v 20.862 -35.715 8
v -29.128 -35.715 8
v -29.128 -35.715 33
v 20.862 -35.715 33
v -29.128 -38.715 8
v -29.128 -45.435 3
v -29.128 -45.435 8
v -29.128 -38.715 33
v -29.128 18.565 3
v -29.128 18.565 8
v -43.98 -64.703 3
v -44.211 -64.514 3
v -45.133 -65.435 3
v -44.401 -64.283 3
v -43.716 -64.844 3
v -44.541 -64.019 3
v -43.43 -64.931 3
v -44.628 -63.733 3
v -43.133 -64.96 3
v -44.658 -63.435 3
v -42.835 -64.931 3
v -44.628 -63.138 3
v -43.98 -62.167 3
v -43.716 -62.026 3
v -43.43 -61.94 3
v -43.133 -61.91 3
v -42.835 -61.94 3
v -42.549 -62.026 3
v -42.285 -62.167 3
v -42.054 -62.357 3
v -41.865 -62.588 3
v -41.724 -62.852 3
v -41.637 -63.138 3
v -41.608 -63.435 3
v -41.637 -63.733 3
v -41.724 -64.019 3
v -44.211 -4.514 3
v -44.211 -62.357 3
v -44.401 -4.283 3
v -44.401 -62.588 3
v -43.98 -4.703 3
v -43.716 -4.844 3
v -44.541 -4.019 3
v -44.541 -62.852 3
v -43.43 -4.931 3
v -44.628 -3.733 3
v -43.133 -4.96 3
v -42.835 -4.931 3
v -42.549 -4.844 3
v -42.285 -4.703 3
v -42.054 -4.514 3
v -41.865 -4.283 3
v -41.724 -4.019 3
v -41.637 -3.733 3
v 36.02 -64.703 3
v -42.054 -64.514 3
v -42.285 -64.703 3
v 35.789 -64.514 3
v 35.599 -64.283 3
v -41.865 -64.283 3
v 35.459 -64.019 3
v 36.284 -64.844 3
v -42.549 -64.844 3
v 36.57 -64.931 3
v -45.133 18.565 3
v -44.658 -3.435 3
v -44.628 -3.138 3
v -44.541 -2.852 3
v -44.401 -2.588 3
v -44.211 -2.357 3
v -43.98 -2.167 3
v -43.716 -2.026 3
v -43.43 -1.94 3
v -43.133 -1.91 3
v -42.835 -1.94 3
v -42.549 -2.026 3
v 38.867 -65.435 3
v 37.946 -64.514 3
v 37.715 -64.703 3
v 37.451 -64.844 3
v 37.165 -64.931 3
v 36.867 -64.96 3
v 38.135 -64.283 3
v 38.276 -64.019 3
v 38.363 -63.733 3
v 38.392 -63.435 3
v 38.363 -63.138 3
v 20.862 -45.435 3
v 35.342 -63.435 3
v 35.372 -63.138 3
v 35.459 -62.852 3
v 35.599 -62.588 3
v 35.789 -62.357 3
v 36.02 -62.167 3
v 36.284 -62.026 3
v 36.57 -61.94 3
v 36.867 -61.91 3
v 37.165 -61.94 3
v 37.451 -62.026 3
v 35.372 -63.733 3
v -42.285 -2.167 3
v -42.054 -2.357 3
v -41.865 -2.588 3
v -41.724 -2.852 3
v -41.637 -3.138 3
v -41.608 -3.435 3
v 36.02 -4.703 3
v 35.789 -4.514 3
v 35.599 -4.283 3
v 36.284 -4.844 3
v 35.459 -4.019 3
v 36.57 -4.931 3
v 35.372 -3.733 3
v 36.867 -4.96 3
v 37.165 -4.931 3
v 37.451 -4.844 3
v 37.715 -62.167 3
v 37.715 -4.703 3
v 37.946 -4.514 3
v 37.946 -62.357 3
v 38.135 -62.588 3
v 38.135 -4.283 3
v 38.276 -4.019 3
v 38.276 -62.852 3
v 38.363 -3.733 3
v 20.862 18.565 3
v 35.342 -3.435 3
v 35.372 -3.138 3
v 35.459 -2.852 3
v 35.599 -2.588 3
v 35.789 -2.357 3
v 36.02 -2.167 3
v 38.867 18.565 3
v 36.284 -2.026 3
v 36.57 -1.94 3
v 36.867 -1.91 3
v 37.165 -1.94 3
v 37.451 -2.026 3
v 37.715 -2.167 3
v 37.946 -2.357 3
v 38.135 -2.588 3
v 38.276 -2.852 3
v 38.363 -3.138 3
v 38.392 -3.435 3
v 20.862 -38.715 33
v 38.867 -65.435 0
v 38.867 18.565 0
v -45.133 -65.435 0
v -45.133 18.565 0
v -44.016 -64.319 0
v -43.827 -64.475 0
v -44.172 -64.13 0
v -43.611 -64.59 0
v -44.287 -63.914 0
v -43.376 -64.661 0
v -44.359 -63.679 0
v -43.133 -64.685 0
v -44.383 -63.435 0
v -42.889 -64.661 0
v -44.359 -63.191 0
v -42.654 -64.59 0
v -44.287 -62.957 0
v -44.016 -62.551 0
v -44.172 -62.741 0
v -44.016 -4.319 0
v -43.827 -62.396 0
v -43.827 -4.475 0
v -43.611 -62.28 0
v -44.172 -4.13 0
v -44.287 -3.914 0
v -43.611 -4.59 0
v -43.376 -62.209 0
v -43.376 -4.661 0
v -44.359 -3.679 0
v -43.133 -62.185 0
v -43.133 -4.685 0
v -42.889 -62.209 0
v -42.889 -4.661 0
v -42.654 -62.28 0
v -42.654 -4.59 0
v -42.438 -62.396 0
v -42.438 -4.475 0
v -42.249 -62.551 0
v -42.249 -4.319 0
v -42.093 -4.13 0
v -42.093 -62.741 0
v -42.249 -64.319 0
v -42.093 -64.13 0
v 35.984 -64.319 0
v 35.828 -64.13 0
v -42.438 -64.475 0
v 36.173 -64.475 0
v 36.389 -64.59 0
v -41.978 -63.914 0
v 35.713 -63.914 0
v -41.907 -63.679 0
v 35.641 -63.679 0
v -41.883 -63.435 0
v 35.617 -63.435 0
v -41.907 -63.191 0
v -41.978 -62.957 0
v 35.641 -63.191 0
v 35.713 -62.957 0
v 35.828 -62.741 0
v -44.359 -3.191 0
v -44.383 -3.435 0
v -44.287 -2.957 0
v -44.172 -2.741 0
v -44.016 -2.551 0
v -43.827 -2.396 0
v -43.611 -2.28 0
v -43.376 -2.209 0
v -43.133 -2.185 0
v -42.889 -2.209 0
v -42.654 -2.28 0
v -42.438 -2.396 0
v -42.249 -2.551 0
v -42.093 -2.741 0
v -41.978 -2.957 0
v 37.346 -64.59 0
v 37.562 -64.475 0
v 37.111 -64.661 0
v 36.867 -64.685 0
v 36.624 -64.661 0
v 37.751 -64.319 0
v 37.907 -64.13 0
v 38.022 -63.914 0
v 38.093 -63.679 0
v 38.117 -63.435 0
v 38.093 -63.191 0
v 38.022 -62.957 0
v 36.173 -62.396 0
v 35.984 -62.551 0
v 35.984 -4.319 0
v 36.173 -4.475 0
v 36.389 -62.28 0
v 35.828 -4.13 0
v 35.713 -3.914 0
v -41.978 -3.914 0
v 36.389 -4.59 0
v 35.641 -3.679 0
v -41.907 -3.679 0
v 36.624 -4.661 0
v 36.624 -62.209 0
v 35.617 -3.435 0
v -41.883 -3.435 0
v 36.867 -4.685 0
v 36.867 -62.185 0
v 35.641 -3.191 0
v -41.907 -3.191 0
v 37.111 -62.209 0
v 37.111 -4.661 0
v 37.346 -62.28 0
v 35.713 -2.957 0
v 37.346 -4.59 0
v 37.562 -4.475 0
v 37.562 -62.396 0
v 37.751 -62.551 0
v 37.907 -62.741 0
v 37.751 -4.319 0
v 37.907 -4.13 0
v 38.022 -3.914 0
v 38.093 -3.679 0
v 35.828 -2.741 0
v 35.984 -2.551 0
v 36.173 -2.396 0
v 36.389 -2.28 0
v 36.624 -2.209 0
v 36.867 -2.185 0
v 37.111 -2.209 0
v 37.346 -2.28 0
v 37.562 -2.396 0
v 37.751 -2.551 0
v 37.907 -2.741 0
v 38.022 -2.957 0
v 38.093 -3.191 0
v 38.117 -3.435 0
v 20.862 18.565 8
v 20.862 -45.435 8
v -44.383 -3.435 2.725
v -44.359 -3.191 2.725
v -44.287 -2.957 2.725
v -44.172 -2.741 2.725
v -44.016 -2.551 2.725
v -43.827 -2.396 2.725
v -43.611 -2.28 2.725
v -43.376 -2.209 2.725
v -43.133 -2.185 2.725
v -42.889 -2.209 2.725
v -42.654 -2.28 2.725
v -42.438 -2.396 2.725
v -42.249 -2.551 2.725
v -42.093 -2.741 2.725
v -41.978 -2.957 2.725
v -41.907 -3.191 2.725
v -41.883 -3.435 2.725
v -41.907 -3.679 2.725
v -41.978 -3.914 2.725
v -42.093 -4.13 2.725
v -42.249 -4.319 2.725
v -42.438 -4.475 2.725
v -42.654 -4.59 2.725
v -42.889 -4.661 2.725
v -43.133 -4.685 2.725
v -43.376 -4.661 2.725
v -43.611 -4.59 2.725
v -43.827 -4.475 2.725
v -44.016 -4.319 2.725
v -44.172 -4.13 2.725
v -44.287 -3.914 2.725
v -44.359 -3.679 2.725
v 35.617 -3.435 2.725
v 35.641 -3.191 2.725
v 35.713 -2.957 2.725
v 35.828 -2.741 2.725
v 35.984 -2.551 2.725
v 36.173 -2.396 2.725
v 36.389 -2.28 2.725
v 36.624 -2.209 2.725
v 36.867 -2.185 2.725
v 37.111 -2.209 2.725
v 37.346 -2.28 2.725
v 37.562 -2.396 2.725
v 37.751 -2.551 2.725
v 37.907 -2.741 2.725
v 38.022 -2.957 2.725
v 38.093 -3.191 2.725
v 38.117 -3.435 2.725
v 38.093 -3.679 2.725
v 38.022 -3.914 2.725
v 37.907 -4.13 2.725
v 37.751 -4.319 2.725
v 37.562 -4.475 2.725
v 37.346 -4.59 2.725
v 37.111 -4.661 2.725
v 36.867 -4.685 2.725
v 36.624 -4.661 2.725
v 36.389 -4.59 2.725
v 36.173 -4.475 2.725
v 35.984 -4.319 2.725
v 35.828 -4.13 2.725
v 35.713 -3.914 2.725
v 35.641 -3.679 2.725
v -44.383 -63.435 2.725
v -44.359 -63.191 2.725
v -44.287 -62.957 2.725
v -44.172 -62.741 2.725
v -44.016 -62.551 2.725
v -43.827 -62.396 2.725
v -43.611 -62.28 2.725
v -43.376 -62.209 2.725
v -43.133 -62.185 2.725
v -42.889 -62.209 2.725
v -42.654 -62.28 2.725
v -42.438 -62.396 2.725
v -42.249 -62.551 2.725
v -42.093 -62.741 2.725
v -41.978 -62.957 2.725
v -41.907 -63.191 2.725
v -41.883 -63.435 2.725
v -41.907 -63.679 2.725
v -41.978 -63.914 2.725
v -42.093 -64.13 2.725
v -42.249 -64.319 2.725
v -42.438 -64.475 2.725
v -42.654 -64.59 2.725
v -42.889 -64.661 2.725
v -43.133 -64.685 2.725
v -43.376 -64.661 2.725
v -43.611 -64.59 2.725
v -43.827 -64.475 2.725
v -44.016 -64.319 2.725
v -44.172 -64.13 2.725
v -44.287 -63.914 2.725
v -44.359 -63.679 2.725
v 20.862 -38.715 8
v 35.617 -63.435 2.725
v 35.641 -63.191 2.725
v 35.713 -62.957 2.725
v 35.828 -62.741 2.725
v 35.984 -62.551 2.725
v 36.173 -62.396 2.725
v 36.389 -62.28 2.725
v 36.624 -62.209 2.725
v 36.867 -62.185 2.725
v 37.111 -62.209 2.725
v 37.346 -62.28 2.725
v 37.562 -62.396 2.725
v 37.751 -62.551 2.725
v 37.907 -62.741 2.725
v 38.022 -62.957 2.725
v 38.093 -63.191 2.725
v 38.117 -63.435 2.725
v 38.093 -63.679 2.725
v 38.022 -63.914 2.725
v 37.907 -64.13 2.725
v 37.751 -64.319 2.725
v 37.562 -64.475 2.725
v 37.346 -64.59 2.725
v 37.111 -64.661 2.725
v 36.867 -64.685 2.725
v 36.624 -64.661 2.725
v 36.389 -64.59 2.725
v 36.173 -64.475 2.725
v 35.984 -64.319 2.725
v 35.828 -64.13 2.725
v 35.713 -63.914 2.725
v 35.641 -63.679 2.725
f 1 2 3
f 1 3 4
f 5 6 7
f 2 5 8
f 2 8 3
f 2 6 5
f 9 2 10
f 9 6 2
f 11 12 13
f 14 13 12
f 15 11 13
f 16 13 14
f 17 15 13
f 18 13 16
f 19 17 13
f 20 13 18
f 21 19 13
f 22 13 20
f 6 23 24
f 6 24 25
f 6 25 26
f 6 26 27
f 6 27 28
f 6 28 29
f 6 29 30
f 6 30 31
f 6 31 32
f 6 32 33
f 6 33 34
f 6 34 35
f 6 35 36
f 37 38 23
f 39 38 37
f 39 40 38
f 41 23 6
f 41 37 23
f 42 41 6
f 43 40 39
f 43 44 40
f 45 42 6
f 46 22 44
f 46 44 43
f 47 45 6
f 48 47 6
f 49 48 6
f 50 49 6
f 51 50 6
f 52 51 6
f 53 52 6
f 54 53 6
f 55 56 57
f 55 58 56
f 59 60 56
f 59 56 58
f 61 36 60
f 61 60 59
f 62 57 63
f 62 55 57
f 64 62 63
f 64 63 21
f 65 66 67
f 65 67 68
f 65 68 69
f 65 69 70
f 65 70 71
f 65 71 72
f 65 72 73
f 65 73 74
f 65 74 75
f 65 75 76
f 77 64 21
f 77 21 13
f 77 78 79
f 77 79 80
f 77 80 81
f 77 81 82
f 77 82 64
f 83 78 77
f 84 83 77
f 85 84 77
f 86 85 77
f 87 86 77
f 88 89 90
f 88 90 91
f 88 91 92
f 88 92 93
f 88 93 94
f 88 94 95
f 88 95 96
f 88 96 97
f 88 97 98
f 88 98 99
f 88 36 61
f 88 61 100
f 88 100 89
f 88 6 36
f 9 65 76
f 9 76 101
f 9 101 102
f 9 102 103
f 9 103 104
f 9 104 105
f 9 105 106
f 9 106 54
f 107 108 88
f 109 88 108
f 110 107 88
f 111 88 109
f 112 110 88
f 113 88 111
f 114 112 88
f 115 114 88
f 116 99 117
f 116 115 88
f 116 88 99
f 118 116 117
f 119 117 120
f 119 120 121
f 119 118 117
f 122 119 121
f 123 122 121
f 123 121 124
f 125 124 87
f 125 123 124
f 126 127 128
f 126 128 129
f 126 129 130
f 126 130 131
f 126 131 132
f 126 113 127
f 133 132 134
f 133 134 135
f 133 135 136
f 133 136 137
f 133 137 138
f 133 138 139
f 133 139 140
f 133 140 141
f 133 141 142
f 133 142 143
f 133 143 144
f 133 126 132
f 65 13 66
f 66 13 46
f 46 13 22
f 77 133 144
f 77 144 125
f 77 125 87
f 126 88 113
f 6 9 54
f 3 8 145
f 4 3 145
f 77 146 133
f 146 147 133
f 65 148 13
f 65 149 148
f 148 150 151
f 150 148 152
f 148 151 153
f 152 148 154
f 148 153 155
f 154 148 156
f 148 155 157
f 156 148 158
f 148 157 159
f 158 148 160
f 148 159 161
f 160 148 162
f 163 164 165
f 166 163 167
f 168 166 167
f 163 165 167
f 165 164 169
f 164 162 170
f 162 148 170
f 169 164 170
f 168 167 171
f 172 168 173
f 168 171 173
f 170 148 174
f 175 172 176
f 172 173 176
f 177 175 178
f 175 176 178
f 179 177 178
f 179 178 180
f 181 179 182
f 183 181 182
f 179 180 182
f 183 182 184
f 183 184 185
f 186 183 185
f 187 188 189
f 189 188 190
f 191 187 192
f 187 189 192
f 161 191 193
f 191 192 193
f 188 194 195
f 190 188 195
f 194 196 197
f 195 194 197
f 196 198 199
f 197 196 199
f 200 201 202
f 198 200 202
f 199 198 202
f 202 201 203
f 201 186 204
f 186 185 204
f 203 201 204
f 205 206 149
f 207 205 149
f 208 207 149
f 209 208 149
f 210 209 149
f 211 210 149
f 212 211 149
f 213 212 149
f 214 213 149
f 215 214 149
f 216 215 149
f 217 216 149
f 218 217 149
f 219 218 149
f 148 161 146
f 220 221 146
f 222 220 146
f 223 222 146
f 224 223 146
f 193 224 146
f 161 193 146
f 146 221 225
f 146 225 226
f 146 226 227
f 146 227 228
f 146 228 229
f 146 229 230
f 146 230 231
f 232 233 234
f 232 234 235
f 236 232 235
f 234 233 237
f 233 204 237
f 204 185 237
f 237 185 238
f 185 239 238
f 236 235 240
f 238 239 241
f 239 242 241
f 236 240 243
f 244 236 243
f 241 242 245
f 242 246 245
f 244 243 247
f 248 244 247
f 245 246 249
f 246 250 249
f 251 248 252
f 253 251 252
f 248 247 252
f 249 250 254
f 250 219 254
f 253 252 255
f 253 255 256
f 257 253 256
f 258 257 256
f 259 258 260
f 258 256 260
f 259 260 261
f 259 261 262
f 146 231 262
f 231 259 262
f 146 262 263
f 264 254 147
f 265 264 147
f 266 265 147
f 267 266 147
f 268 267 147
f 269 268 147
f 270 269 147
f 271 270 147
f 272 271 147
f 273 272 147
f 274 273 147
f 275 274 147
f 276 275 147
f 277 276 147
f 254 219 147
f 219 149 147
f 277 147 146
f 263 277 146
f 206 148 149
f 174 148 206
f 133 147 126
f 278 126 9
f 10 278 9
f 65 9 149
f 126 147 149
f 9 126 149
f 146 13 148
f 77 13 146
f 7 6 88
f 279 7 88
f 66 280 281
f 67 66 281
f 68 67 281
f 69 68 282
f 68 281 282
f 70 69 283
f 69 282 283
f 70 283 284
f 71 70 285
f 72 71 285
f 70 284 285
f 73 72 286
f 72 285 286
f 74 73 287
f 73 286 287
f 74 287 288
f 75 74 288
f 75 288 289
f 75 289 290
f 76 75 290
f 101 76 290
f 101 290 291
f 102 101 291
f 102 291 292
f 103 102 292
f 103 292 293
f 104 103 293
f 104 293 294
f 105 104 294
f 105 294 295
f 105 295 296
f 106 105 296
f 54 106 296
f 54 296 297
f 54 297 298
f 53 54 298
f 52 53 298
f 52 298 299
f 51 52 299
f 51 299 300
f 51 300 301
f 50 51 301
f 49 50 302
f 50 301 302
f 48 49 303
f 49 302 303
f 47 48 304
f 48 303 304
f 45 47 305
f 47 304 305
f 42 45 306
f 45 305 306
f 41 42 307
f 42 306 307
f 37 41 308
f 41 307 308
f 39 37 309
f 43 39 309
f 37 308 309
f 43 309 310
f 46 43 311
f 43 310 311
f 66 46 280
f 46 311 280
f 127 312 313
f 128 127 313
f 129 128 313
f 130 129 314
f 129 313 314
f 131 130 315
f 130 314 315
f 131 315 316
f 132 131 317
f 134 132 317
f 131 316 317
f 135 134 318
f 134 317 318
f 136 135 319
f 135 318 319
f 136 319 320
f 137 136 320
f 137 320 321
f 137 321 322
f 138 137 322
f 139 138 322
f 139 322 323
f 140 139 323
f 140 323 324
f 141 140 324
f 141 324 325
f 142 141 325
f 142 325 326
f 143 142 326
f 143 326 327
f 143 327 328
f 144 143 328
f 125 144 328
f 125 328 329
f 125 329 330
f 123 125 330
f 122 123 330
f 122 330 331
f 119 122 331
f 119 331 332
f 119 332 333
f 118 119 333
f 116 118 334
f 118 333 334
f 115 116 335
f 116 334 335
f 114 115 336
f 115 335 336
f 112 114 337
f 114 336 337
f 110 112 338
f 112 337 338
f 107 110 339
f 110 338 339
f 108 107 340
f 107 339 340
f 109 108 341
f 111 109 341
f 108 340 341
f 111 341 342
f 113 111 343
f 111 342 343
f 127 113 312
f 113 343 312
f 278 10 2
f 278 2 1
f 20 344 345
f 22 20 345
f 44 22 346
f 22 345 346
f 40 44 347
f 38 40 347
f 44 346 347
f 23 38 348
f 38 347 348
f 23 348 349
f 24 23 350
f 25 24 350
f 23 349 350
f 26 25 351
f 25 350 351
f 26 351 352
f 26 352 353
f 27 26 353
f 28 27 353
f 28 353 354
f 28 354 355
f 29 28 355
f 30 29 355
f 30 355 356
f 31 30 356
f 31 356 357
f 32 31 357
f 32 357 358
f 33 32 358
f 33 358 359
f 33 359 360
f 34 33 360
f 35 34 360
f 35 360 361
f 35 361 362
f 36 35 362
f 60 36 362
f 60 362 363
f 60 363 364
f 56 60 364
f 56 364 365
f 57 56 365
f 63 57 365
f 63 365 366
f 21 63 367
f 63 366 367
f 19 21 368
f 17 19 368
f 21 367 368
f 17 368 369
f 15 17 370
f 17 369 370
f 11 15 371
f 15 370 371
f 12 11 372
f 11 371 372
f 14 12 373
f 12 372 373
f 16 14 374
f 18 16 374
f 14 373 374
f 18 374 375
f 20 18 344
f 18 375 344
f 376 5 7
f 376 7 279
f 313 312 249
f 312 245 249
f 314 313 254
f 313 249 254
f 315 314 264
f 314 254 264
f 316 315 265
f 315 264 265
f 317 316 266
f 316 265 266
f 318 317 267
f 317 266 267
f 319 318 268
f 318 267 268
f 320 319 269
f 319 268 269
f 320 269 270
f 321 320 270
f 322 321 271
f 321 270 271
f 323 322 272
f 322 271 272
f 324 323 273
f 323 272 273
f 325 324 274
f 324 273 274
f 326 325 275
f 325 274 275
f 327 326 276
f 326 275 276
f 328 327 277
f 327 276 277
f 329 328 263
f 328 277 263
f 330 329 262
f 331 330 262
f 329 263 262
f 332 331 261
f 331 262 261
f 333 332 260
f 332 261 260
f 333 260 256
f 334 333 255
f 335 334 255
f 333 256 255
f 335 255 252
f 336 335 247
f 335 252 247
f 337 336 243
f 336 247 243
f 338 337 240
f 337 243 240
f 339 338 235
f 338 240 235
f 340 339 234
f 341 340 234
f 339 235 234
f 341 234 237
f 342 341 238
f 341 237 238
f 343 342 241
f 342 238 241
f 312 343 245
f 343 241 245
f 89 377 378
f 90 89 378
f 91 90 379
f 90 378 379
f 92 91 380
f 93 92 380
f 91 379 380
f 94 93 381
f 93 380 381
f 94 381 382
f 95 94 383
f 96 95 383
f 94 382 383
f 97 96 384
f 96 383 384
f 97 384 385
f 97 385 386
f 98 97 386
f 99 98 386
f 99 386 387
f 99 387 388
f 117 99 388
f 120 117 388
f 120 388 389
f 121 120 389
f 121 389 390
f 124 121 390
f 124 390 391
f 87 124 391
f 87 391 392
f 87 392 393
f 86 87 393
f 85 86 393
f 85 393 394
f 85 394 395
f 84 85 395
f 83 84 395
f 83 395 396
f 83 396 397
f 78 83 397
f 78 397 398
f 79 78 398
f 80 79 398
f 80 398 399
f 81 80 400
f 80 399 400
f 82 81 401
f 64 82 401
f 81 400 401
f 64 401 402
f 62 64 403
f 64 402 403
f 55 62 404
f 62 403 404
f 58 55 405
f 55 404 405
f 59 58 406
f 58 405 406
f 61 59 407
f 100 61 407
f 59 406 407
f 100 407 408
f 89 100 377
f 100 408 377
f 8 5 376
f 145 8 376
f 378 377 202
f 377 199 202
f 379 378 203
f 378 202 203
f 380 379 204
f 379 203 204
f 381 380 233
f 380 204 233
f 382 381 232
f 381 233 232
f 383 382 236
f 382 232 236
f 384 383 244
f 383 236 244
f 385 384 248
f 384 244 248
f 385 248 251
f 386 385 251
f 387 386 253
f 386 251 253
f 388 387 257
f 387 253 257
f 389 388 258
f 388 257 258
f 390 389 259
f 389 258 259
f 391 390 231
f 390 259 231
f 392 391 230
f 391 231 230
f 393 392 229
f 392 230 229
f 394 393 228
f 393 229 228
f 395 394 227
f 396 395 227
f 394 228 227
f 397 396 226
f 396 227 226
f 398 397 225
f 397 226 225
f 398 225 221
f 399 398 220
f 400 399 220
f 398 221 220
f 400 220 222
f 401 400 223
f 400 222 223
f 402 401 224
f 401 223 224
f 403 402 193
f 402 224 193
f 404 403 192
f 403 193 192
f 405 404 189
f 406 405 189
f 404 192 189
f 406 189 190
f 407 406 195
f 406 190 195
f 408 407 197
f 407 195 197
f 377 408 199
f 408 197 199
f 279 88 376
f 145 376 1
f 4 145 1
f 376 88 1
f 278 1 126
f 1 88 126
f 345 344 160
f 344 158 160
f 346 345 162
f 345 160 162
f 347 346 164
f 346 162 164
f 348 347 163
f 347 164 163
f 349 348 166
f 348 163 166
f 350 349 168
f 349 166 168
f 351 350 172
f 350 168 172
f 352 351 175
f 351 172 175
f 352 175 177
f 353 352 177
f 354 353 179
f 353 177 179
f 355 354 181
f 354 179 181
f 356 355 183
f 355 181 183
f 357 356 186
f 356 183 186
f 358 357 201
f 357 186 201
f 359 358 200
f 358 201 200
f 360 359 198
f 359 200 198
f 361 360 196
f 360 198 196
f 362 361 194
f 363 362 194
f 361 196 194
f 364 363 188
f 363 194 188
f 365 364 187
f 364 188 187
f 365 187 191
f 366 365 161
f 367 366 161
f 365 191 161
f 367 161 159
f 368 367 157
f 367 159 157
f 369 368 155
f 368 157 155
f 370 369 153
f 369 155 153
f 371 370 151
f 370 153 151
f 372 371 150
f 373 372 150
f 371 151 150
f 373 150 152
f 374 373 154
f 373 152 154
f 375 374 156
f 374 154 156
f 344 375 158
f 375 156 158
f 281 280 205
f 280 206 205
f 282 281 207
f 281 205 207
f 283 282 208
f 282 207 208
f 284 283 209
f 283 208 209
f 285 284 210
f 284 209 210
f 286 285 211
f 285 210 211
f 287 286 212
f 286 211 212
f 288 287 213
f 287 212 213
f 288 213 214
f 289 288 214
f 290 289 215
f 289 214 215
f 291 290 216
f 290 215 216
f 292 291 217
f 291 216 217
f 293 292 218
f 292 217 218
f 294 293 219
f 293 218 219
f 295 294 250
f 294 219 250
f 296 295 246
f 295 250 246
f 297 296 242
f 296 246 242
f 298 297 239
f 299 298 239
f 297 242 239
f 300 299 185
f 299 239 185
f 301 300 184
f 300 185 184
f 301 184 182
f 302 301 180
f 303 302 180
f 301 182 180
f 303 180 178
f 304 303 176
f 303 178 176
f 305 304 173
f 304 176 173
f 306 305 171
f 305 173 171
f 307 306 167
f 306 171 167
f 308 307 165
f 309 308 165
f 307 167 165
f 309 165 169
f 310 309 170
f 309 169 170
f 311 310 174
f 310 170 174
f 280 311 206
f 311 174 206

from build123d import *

# Parameters (mm, degrees)
SKETCH_2_W                   = 62
SKETCH_2_H                   = 45
EXTRUDE_3_DEPTH              = 8
SKETCH_3_W                   = 3.004963504
SKETCH_3_H                   = 5
CUT_EXTRUDE_1_DEPTH          = 58.648048048
EXTRUDE_4_DEPTH              = 3
SKETCH_6_W                   = 3
SKETCH_6_H                   = 5
EXTRUDE_5_DEPTH              = 2
SKETCH_7_W                   = 3
SKETCH_7_H                   = 5
EXTRUDE_6_DEPTH              = 2
SKETCH_8_W                   = 49.990072992
SKETCH_8_H                   = 5
EXTRUDE_7_DEPTH              = 2
SKETCH_9_W                   = 3
SKETCH_9_H                   = 5
CUT_EXTRUDE_2_DEPTH          = 66.65020057
SKETCH_10_W                  = 3
SKETCH_10_H                  = 5
CUT_EXTRUDE_4_DEPTH          = 66.65020057
SKETCH_11_W                  = 49.990072992
SKETCH_11_H                  = 5
EXTRUDE_8_DEPTH              = 17
SKETCH_12_W                  = 49.990072992
SKETCH_12_H                  = 3
EXTRUDE_9_DEPTH              = 25
EXTRUDE_START                = 3.72
SKETCH_16_W                  = 49.990072992
SKETCH_16_H                  = 25
EXTRUDE_10_DEPTH             = 3
SKETCH_17_W                  = 49.990072992
SKETCH_17_H                  = 25
CUT_EXTRUDE_5_DEPTH          = 81.043408441
SKETCH_18_W                  = 84
SKETCH_18_H                  = 3
EXTRUDE_11_DEPTH             = 20
HOLE_WIZARD_M3_2_D           = 2.5
HOLE_WIZARD_M3_2_CSINK_D     = 3.05
HOLE_WIZARD_M3_2_CSINK_ANGLE = 90


with BuildPart() as part:
    # 草图2 → 凸台-拉伸3 (new body)
    with BuildSketch(Plane.XY):
        with Locations((-4.132569558, -3.93531014)):
            Rectangle(SKETCH_2_W, SKETCH_2_H)
    extrude(amount=EXTRUDE_3_DEPTH)

    # 草图3 → 切除-拉伸1 (cut, through all)
    with BuildSketch(Plane.XZ.offset(26.43531014)):
        with Locations((-30.630087806, 5.5)):
            Rectangle(SKETCH_3_W, SKETCH_3_H)
        with Locations((22.36494869, 5.5)):
            Rectangle(SKETCH_3_W, SKETCH_3_H)
    extrude(amount=-CUT_EXTRUDE_1_DEPTH, mode=Mode.SUBTRACT)

    # 草图5 → 凸台-拉伸4 (add)
    with BuildSketch(Plane(origin=(0, 0, 0), x_dir=(-1, 0, 0), z_dir=(0, 0, -1))):
        Polygon((-38.867430442, -45.43531014), (-38.867430442, 18.56468986), (45.132569558, 18.56468986), (45.132569558, -45.43531014), (3.132569558, -45.43531014), align=None)
    extrude(amount=-EXTRUDE_4_DEPTH)

    # 草图6 → 凸台-拉伸5 (add)
    with BuildSketch(Plane.XZ.offset(26.43531014)):
        with Locations((-33.632569558, 5.5)):
            Rectangle(SKETCH_6_W, SKETCH_6_H)
    extrude(amount=EXTRUDE_5_DEPTH)

    # 草图7 → 凸台-拉伸6 (add)
    with BuildSketch(Plane.XZ.offset(26.43531014)):
        with Locations((25.367430442, 5.5)):
            Rectangle(SKETCH_7_W, SKETCH_7_H)
    extrude(amount=EXTRUDE_6_DEPTH)

    # 草图8 → 凸台-拉伸7 (add)
    with BuildSketch(Plane.XZ.offset(26.43531014)):
        with Locations((-4.132569558, 5.5)):
            Rectangle(SKETCH_8_W, SKETCH_8_H)
    extrude(amount=EXTRUDE_7_DEPTH)

    # 草图9 → 切除-拉伸2 (cut, through all)
    with BuildSketch(Plane.XZ.offset(28.43531014)):
        with Locations((-33.632569558, 5.5)):
            Rectangle(SKETCH_9_W, SKETCH_9_H)
    extrude(amount=-CUT_EXTRUDE_2_DEPTH, mode=Mode.SUBTRACT)

    # 草图10 → 切除-拉伸4 (cut, through all)
    with BuildSketch(Plane.XZ.offset(28.43531014)):
        with Locations((25.367430442, 5.5)):
            Rectangle(SKETCH_10_W, SKETCH_10_H)
    extrude(amount=-CUT_EXTRUDE_4_DEPTH, mode=Mode.SUBTRACT)

    # 草图11 → 凸台-拉伸8 (add)
    with BuildSketch(Plane.XZ.offset(28.43531014)):
        with Locations((-4.132569558, 5.5)):
            Rectangle(SKETCH_11_W, SKETCH_11_H)
    extrude(amount=EXTRUDE_8_DEPTH)

    # 草图12 → 凸台-拉伸9 (add)
    with BuildSketch(Plane.XY.offset(8)):
        with Locations((-4.132569558, -43.93531014)):
            Rectangle(SKETCH_12_W, SKETCH_12_H)
    extrude(amount=EXTRUDE_9_DEPTH)

    # 草图16 → 凸台-拉伸10 (add)
    with BuildSketch(Plane(origin=(0, -42.43531014, 0), x_dir=(1, 0, 0), z_dir=(0, 1, 0)).offset(EXTRUDE_START)):
        with Locations((-4.132569558, -20.5)):
            Rectangle(SKETCH_16_W, SKETCH_16_H)
    extrude(amount=EXTRUDE_10_DEPTH)

    # 草图17 → 切除-拉伸5 (cut, through all)
    with BuildSketch(Plane.XZ.offset(38.71531014)):
        with Locations((-4.132569558, 20.5)):
            Rectangle(SKETCH_17_W, SKETCH_17_H)
    extrude(amount=CUT_EXTRUDE_5_DEPTH, mode=Mode.SUBTRACT)

    # 草图18 → 凸台-拉伸11 (add)
    with BuildSketch(Plane.XZ.offset(45.43531014)):
        with Locations((-3.132569558, 1.5)):
            Rectangle(SKETCH_18_W, SKETCH_18_H)
    extrude(amount=EXTRUDE_11_DEPTH)

    # M3 螺纹孔2 (through all)
    with Locations(Plane.XY.offset(3)):
        with Locations((-43.132569558, -3.43531014), (36.867430442, -3.43531014), (36.867430442, -63.43531014), (-43.132569558, -63.43531014)):
            CounterSinkHole(HOLE_WIZARD_M3_2_D / 2, HOLE_WIZARD_M3_2_CSINK_D / 2, counter_sink_angle=HOLE_WIZARD_M3_2_CSINK_ANGLE)


solid = part.part
